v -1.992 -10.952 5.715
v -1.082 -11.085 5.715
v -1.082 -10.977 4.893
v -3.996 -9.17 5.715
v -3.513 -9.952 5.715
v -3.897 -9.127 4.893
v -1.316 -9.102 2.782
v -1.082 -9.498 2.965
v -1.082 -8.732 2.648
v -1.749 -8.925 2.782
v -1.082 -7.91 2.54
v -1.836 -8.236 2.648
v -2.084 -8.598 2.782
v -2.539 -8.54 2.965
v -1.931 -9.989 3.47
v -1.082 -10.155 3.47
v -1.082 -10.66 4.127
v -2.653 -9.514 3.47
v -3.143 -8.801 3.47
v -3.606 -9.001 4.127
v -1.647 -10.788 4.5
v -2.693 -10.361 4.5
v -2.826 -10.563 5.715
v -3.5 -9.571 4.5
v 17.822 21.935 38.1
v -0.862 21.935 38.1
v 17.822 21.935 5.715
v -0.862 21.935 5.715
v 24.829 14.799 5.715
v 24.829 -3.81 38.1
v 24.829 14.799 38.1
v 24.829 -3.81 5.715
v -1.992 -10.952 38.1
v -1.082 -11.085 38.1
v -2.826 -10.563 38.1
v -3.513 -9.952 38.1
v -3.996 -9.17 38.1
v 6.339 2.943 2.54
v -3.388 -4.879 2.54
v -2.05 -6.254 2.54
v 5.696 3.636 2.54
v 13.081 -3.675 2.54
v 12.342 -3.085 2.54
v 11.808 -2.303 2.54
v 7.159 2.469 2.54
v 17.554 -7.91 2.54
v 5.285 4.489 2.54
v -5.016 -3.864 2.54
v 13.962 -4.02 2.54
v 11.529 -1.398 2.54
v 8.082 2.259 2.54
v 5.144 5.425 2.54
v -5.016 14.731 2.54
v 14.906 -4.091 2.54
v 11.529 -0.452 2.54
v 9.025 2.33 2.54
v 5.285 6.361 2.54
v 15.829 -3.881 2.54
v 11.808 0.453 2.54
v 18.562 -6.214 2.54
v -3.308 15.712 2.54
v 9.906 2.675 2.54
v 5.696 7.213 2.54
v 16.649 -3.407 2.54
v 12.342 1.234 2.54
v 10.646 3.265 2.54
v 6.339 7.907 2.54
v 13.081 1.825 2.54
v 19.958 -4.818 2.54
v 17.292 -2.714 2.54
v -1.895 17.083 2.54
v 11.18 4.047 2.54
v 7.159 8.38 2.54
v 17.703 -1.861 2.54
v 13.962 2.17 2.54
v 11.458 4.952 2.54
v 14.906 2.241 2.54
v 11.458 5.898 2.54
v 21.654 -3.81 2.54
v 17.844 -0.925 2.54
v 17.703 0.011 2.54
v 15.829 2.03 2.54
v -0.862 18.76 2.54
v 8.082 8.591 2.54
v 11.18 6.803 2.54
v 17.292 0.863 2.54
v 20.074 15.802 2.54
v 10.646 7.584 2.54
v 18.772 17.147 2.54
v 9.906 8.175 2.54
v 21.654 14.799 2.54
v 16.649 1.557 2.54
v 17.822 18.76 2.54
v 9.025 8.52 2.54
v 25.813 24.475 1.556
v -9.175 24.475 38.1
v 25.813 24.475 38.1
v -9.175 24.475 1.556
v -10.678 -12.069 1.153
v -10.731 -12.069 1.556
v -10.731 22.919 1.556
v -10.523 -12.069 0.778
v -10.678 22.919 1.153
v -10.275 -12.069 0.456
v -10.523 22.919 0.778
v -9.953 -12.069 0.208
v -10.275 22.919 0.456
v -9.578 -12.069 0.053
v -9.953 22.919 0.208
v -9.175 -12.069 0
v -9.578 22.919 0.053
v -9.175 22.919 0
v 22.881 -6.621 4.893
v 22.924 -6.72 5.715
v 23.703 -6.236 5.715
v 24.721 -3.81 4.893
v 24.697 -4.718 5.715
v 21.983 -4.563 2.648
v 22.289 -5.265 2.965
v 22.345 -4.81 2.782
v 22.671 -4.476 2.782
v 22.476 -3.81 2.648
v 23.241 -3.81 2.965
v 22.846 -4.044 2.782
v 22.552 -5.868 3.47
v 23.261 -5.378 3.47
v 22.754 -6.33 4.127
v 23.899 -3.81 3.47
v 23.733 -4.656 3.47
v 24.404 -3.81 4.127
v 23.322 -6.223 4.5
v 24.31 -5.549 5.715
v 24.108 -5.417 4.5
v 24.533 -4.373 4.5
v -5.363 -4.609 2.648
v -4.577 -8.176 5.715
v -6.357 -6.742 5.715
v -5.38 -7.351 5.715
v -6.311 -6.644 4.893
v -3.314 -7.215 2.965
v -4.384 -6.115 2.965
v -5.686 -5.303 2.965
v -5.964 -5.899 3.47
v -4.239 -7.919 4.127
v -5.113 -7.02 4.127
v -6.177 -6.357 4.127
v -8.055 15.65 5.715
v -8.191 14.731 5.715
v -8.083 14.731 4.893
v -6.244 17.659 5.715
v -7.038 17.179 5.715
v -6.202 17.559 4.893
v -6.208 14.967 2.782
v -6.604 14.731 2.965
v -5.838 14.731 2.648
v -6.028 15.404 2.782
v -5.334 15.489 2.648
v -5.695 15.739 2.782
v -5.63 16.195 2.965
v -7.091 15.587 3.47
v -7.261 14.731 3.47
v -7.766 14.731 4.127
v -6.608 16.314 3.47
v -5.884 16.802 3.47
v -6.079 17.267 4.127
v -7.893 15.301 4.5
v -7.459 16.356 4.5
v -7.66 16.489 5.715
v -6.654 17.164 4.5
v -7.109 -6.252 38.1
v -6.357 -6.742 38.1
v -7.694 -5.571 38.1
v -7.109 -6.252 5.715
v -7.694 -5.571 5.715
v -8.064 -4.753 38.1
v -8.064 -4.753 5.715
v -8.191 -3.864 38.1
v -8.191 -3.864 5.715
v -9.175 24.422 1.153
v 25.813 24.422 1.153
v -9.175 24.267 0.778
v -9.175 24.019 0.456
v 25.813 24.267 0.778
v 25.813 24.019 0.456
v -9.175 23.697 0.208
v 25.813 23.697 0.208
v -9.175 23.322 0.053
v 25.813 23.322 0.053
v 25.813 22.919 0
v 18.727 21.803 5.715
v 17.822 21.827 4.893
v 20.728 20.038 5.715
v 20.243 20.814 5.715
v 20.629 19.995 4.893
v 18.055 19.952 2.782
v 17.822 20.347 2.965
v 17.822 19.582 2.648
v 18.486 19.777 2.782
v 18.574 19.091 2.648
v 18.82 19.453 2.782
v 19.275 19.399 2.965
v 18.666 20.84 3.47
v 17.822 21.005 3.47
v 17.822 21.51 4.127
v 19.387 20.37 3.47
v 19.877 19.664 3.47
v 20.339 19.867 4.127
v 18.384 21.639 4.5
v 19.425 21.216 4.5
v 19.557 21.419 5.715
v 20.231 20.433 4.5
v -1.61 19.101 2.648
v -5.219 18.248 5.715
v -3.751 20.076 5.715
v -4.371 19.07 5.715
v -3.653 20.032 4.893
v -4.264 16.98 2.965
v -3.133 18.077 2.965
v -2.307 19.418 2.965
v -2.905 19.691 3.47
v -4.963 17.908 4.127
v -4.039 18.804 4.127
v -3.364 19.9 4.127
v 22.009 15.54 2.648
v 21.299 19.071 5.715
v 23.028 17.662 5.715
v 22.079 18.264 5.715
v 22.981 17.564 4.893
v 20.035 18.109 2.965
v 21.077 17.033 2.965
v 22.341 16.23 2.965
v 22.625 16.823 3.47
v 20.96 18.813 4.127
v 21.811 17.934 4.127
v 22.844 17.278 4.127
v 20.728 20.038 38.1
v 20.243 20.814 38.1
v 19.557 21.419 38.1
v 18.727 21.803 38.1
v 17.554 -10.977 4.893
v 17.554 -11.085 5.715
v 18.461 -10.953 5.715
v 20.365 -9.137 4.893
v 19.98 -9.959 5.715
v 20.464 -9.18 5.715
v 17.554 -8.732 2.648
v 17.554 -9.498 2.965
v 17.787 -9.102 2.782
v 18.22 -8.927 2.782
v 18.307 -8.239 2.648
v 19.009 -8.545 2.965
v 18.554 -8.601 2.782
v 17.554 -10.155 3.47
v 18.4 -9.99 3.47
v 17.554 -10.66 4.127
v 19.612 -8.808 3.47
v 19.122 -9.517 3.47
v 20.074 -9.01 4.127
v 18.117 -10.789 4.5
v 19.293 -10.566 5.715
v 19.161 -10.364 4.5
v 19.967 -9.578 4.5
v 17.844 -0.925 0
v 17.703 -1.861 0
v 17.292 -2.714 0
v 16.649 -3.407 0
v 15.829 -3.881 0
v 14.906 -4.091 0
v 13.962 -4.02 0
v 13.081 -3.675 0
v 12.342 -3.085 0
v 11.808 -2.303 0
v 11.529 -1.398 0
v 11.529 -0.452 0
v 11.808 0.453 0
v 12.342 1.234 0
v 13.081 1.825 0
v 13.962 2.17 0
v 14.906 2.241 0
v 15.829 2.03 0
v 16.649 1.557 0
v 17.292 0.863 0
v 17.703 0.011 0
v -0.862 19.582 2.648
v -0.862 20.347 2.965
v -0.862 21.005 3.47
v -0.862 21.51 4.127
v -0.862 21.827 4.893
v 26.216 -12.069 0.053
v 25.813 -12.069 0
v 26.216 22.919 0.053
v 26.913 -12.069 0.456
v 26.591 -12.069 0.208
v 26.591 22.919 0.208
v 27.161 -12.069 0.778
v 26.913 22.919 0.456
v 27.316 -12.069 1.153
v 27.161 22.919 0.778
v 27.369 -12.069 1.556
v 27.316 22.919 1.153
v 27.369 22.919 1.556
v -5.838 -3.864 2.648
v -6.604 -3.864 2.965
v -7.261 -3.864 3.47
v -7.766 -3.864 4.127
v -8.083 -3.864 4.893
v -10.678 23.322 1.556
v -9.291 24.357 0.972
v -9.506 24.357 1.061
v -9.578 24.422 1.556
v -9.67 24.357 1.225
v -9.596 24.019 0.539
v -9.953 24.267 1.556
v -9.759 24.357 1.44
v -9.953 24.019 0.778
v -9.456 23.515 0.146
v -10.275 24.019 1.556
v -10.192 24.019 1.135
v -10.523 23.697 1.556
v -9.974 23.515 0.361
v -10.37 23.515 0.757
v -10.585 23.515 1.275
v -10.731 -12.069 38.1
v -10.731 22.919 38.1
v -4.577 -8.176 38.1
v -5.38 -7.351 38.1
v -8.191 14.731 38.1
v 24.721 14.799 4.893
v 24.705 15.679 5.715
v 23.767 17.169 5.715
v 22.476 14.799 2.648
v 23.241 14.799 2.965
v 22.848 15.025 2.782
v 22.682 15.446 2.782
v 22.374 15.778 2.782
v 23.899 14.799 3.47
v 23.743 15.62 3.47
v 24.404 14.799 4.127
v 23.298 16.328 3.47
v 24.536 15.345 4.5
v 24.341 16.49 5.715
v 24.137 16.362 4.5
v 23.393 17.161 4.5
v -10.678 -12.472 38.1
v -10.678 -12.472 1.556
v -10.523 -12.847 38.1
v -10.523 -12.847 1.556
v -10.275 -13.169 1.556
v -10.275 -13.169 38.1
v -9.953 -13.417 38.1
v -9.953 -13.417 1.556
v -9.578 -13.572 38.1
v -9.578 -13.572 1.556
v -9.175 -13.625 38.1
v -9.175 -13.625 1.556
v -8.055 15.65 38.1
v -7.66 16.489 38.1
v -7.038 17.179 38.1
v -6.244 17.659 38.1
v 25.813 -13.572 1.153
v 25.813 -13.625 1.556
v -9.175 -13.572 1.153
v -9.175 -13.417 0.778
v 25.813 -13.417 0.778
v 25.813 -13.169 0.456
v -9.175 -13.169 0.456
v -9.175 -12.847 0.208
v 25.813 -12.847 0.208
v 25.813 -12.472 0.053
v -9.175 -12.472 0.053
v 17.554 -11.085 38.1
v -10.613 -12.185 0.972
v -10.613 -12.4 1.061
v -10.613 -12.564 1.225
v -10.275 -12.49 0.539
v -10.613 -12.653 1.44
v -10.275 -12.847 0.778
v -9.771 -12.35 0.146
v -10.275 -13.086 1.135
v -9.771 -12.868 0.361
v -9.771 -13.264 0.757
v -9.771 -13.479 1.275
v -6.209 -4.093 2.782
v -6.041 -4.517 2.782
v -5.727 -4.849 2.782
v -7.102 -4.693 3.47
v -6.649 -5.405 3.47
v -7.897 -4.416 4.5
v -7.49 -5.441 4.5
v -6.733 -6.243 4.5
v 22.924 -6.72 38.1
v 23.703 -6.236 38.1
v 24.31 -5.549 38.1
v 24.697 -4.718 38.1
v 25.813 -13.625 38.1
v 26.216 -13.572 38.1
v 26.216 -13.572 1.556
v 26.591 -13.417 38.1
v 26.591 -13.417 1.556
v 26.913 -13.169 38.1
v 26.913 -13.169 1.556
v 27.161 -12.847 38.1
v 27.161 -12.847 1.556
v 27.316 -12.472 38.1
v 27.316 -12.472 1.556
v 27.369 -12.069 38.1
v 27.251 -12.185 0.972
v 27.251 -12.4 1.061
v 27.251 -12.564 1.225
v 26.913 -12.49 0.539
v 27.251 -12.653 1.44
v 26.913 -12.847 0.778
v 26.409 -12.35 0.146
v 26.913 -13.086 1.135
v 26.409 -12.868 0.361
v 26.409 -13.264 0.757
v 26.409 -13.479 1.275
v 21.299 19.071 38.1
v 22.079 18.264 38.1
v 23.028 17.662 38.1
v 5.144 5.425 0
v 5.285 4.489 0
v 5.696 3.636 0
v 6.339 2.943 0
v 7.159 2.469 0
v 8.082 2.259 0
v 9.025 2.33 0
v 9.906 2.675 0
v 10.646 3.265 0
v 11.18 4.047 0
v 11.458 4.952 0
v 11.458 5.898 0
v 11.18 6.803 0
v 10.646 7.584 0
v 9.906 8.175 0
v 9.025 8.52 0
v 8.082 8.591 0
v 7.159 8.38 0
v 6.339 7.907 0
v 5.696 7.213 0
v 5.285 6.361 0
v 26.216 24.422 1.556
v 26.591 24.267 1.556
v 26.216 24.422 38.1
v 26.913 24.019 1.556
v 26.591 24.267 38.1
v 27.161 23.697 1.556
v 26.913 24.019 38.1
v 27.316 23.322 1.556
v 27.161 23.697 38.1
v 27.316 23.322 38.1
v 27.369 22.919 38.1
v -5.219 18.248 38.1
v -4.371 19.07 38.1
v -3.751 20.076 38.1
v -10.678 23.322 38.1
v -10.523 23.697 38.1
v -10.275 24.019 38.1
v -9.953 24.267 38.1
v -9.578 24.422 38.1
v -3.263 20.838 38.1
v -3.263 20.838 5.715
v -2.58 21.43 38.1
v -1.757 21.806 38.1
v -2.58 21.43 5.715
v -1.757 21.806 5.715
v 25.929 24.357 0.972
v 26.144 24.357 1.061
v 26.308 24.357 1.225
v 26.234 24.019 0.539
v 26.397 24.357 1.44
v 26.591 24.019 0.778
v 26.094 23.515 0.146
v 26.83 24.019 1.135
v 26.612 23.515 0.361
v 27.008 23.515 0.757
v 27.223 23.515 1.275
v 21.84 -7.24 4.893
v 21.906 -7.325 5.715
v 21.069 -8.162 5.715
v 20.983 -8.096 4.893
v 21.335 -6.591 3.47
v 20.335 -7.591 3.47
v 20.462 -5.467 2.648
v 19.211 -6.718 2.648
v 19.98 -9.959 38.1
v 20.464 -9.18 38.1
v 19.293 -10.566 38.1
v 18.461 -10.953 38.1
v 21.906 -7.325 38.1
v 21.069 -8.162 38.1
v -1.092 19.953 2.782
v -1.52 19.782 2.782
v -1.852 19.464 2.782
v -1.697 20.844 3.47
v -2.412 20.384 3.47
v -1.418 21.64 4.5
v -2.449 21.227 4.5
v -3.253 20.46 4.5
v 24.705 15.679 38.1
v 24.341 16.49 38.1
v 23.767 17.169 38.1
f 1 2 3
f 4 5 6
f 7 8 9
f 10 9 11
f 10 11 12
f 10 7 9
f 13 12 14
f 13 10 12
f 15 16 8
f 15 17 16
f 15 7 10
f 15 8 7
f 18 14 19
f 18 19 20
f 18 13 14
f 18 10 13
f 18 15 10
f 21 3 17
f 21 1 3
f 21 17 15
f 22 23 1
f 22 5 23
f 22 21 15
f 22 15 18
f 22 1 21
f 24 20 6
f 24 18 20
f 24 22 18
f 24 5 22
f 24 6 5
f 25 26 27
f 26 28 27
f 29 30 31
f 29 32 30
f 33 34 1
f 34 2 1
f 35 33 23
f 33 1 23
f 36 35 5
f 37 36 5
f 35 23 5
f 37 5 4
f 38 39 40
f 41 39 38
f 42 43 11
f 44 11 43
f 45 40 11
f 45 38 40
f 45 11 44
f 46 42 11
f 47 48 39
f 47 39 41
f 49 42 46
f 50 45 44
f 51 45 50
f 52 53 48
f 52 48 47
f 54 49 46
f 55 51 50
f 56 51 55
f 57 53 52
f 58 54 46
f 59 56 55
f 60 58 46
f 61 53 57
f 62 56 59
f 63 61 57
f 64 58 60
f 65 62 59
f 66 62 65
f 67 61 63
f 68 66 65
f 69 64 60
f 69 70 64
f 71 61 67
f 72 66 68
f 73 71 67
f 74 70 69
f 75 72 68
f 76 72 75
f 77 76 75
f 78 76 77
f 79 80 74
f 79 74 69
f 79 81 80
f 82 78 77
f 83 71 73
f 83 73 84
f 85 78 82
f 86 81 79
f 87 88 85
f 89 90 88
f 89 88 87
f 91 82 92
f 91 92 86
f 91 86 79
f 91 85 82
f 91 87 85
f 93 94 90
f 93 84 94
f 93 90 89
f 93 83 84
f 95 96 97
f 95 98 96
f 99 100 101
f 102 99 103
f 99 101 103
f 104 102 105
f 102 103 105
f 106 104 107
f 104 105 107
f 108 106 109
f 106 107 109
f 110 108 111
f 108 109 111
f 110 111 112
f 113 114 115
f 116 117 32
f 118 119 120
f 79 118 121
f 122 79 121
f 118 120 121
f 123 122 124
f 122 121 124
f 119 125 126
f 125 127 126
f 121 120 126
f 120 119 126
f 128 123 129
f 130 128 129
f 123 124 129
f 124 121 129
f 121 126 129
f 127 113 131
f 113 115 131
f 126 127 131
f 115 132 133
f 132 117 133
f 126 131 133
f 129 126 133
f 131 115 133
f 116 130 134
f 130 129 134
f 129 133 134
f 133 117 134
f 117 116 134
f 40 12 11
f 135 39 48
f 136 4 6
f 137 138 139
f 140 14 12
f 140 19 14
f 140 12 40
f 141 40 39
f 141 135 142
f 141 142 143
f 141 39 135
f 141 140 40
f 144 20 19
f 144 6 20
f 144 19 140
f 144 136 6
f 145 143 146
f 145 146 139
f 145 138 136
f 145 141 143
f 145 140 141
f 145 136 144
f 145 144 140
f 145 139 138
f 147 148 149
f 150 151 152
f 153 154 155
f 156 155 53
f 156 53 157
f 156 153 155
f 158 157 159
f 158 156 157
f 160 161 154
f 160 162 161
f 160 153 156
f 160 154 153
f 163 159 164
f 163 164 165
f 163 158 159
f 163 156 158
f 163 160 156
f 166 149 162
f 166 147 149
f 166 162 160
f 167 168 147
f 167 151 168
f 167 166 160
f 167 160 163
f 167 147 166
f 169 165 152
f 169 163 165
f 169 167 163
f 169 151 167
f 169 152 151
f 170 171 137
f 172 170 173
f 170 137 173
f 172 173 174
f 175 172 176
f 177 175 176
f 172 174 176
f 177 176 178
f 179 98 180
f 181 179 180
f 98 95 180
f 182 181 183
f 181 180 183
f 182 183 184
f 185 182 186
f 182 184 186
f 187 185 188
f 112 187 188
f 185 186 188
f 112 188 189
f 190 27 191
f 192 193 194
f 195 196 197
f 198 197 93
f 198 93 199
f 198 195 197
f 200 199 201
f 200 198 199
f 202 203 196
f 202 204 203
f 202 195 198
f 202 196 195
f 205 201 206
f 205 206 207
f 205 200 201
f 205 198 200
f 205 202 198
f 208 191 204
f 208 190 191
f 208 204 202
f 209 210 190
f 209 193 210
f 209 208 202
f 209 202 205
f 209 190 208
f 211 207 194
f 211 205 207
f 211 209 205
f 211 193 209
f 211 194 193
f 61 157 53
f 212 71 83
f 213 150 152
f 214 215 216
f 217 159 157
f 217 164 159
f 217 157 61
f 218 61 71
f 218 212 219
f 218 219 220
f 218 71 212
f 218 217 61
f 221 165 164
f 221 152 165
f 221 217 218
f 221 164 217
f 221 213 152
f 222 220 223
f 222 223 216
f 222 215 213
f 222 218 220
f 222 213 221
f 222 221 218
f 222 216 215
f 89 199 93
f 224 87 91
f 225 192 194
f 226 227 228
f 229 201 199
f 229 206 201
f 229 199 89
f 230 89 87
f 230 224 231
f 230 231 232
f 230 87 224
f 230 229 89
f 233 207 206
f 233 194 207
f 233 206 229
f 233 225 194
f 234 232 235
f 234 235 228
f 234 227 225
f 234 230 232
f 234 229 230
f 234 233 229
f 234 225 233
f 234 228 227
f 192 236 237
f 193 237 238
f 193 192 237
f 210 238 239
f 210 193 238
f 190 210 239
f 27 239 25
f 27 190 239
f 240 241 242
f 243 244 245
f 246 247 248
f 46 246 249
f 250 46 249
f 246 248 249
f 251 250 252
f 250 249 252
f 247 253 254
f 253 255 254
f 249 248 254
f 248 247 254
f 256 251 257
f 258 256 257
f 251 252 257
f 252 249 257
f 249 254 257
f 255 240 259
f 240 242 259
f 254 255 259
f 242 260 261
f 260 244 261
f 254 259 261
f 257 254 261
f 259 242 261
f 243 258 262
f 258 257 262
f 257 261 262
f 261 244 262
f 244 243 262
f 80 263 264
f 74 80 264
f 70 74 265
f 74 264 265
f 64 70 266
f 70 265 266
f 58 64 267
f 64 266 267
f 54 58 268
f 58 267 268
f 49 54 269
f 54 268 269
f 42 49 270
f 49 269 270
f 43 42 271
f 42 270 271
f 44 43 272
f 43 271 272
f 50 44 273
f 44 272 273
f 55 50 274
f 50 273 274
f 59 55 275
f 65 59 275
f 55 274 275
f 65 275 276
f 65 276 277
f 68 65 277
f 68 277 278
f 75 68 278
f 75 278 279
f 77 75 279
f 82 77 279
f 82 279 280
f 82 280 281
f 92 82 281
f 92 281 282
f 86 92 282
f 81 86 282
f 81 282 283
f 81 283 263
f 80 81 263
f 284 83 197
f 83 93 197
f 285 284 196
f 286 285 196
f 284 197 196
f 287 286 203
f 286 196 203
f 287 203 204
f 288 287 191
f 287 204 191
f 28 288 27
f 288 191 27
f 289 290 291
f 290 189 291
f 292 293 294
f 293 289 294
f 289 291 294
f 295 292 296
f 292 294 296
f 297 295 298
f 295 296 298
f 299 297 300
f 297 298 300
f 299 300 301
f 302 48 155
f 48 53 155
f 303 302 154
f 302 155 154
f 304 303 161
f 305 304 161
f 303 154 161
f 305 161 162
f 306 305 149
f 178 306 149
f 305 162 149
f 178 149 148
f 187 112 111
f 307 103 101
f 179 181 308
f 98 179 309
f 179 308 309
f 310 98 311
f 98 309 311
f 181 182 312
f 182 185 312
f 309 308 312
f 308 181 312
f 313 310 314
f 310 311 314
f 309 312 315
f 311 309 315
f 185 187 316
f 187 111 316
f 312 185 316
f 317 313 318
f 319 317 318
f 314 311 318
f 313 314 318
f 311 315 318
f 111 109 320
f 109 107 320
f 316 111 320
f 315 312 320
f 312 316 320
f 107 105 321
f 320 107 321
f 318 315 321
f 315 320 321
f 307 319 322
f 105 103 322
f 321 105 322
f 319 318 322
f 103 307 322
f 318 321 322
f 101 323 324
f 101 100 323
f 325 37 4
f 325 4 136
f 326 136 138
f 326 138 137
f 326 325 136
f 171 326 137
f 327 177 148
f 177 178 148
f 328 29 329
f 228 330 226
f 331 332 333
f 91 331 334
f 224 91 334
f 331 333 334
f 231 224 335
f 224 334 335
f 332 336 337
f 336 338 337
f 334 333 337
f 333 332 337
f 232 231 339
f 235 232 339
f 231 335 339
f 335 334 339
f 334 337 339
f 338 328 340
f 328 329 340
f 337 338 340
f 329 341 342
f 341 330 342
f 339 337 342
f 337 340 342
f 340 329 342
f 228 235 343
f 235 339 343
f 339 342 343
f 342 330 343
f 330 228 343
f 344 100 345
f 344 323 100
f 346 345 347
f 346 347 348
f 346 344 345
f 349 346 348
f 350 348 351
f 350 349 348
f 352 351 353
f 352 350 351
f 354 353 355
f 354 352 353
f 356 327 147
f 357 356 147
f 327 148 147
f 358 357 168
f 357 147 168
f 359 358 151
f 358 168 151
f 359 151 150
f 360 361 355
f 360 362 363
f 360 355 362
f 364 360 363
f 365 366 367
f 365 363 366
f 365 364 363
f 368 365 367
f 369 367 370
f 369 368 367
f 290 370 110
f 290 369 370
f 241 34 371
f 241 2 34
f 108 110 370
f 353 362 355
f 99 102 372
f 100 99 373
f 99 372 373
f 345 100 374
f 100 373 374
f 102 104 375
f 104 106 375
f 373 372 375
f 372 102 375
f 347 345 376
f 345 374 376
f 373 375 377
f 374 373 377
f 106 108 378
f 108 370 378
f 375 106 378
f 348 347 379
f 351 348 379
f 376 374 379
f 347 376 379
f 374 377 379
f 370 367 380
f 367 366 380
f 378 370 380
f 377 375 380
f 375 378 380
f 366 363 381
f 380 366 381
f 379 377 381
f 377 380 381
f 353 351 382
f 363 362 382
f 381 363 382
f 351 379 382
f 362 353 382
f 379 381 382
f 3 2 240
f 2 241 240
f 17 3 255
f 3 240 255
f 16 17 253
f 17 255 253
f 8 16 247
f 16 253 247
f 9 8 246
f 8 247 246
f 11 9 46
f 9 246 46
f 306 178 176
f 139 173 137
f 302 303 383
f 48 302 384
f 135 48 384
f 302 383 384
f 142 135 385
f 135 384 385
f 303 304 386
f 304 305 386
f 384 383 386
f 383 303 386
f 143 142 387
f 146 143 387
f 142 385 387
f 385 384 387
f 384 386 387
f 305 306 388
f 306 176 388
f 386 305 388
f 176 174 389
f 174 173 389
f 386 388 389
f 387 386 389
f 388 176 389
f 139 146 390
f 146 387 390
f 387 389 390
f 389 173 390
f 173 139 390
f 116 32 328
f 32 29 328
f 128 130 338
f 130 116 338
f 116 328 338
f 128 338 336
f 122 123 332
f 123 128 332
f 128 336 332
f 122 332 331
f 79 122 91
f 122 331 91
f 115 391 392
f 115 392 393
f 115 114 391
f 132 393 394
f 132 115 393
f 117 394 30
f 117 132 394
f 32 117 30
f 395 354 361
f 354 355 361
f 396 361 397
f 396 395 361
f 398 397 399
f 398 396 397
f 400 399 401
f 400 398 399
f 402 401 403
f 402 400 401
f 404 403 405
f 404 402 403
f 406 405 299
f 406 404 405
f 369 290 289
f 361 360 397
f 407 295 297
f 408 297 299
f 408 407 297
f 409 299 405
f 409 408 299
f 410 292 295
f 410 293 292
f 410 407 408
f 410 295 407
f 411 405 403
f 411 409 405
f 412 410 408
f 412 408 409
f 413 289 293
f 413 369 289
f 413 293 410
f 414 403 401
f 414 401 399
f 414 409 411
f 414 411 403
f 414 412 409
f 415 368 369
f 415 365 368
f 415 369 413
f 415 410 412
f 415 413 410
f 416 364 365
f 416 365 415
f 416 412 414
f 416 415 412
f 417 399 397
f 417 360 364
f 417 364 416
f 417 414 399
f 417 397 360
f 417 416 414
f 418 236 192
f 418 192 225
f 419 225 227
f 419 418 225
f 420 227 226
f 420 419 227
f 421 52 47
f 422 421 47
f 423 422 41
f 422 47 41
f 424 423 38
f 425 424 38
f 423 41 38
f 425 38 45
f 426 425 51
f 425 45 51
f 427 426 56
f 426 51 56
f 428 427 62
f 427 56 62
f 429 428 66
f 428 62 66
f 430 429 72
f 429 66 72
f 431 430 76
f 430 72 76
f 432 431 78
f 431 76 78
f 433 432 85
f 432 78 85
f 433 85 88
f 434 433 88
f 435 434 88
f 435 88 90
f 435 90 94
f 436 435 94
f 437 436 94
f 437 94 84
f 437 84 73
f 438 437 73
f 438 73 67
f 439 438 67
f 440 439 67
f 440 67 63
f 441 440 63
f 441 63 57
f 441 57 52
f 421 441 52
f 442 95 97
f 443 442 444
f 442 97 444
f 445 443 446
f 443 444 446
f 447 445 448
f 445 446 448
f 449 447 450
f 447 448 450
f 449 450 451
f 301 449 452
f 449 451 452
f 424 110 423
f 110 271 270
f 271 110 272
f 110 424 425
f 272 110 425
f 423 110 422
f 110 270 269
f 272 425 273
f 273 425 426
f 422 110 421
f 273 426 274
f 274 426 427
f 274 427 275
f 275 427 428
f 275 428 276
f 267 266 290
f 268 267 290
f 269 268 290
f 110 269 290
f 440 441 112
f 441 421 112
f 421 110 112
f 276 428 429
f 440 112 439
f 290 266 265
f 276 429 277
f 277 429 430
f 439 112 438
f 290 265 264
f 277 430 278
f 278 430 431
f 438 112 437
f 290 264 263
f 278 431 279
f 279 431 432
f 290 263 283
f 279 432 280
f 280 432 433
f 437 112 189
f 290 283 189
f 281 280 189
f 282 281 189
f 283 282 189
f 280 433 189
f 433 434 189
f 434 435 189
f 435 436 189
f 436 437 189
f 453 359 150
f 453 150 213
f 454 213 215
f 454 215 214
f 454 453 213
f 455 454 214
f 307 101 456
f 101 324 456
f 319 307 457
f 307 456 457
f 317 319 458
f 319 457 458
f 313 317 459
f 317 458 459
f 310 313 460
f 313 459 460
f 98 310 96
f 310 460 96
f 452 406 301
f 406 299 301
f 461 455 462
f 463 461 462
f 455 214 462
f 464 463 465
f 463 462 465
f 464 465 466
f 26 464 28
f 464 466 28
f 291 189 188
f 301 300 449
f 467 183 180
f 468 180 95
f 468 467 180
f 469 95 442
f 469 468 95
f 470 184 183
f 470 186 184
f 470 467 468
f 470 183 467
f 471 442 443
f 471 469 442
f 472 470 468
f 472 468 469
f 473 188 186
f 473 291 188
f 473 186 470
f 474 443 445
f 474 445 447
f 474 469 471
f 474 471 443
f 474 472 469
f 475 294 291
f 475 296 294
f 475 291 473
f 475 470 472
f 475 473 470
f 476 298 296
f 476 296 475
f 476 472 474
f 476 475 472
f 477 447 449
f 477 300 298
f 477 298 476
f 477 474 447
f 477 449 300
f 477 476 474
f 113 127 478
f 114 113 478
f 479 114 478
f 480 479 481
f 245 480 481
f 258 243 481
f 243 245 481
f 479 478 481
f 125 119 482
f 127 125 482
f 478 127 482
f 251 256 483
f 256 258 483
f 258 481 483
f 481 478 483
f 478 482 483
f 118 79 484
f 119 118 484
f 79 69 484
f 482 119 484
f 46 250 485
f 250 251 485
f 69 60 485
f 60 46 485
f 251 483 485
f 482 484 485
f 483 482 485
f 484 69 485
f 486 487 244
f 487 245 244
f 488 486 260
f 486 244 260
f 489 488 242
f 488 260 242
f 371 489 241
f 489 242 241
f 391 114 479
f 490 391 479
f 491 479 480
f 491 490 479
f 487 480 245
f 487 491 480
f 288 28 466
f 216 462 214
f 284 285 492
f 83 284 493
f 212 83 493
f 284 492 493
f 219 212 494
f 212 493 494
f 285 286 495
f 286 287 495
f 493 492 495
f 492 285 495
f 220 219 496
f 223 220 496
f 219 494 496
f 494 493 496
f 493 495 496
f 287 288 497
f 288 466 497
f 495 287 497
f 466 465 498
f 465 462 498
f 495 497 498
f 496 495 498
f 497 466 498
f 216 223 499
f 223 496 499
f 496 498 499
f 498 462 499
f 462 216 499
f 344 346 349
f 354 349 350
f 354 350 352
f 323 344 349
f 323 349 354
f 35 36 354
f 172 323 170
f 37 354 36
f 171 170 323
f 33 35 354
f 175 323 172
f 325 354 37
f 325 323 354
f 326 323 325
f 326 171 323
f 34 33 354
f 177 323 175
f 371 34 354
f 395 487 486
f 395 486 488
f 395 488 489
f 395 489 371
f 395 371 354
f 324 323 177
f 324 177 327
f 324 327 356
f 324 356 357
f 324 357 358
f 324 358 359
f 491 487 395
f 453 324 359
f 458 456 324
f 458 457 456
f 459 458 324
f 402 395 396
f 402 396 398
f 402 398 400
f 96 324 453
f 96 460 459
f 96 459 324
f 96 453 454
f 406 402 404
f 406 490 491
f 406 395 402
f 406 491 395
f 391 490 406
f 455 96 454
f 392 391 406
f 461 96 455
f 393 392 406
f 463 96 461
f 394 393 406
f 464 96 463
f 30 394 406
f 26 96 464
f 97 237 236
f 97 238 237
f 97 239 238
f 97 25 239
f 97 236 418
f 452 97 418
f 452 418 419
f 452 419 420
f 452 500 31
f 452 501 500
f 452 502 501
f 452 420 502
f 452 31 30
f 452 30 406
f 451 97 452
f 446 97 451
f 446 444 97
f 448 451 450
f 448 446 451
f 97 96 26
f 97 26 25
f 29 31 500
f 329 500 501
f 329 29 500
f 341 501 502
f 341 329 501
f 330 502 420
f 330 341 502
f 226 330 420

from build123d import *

# Parameters (mm, degrees)
F0_W      = 38.1
F0_H      = 38.1
F1_DEPTH  = 38.1
F2_T      = -2.54
F4_D      = 6.35
F5_R      = 1.55575
F7_DEPTH  = 35.56
F8_R      = 3.175
F9_R      = 3.175
F10_DEPTH = 38.101


with BuildPart() as f1:
    # F0 (on Top) → F1 (new body)
    with BuildSketch(Plane.XY):
        with Locations((8.3189541474, 5.4249440373)):
            Rectangle(F0_W, F0_H)
    extrude(amount=F1_DEPTH)

    # F2
    f2_openings = [f1.faces().sort_by_distance(p)[0] for p in [
        (8.318954, 5.424944, 38.1),
    ]]
    offset(amount=F2_T, openings=f2_openings)

    # F4 (through all)
    with Locations(Plane(origin=(0, 0, 0), x_dir=(1, 0, 0), z_dir=(0, 0, -1))):
        with Locations((8.3189541474, -5.4249440373)):
            Hole(F4_D / 2)

    # F5
    f5_edges = [f1.edges().sort_by_distance(p)[0] for p in [
        (8.318954, -13.625056, 0),
        (-10.731046, 5.424944, 0),
        (27.368954, 5.424944, 0),
        (8.318954, 24.474944, 0),
        (27.368954, 24.474944, 19.05),
        (27.368954, -13.625056, 19.05),
        (-10.731046, 24.474944, 19.05),
        (-10.731046, -13.625056, 19.05),
    ]]
    fillet(f5_edges, radius=F5_R)

    # F6 (on face) → F7 (join, through all)
    with BuildSketch(Plane.XY.offset(38.1)):
        with BuildLine():
            Line((24.8289541474, -11.0850559627), (24.8289541474, -6.3225559627))
            ThreePointArc((24.8289541474, -6.3225559627), (21.461358102, -7.7174599173), (20.0664541474, -11.0850559627))
            Line((20.0664541474, -11.0850559627), (24.8289541474, -11.0850559627))
        make_face()
        with BuildLine():
            Line((24.8289541474, 21.9349440373), (20.3255117221, 21.9349440373))
            ThreePointArc((20.3255117221, 21.9349440373), (21.6370716814, 18.6732811952), (24.8289541474, 17.2000126029))
            Line((24.8289541474, 17.2000126029), (24.8289541474, 21.9349440373))
        make_face()
        with BuildLine():
            Line((-8.1910458526, 21.9349440373), (-8.1910458526, 17.2900056063))
            ThreePointArc((-8.1910458526, 17.2900056063), (-4.797077777, 18.606071813), (-3.3241014455, 21.9349440373))
            Line((-3.3241014455, 21.9349440373), (-8.1910458526, 21.9349440373))
        make_face()
        with BuildLine():
            Line((-8.1910458526, -11.0850559627), (-3.6057208911, -11.0850559627))
            ThreePointArc((-3.6057208911, -11.0850559627), (-4.9295289639, -7.7640913608), (-8.1910458526, -6.2999256305))
            Line((-8.1910458526, -6.2999256305), (-8.1910458526, -11.0850559627))
        make_face()
    extrude(amount=-F7_DEPTH)

    # F8
    f8_edges = [f1.edges().sort_by_distance(p)[0] for p in [
        (24.828954, 17.200013, 20.32),
        (24.828954, 5.438728, 2.54),
        (21.637072, 18.673281, 2.54),
        (20.325512, 21.934944, 20.32),
        (8.500705, 21.934944, 2.54),
        (24.828954, -6.322556, 20.32),
        (21.461358, -7.71746, 2.54),
        (20.066454, -11.085056, 20.32),
        (8.230367, -11.085056, 2.54),
        (-4.929529, -7.764091, 2.54),
        (-8.191046, -6.299926, 20.32),
        (-3.605721, -11.085056, 20.32),
        (-4.797078, 18.606072, 2.54),
        (-8.191046, 17.290006, 20.32),
        (-8.191046, 5.49504, 2.54),
        (-3.324101, 21.934944, 20.32),
    ]]
    fillet(f8_edges, radius=F8_R)

    # F9 (on face) → F10 (cut, through all)
    with BuildSketch(Plane(origin=(0, 0, 0), x_dir=(1, 0, 0), z_dir=(0, 0, -1))):
        with Locations((14.6689541474, 0.9250559627)):
            Circle(F9_R)
    extrude(amount=-F10_DEPTH, mode=Mode.SUBTRACT)


solid = f1.part
